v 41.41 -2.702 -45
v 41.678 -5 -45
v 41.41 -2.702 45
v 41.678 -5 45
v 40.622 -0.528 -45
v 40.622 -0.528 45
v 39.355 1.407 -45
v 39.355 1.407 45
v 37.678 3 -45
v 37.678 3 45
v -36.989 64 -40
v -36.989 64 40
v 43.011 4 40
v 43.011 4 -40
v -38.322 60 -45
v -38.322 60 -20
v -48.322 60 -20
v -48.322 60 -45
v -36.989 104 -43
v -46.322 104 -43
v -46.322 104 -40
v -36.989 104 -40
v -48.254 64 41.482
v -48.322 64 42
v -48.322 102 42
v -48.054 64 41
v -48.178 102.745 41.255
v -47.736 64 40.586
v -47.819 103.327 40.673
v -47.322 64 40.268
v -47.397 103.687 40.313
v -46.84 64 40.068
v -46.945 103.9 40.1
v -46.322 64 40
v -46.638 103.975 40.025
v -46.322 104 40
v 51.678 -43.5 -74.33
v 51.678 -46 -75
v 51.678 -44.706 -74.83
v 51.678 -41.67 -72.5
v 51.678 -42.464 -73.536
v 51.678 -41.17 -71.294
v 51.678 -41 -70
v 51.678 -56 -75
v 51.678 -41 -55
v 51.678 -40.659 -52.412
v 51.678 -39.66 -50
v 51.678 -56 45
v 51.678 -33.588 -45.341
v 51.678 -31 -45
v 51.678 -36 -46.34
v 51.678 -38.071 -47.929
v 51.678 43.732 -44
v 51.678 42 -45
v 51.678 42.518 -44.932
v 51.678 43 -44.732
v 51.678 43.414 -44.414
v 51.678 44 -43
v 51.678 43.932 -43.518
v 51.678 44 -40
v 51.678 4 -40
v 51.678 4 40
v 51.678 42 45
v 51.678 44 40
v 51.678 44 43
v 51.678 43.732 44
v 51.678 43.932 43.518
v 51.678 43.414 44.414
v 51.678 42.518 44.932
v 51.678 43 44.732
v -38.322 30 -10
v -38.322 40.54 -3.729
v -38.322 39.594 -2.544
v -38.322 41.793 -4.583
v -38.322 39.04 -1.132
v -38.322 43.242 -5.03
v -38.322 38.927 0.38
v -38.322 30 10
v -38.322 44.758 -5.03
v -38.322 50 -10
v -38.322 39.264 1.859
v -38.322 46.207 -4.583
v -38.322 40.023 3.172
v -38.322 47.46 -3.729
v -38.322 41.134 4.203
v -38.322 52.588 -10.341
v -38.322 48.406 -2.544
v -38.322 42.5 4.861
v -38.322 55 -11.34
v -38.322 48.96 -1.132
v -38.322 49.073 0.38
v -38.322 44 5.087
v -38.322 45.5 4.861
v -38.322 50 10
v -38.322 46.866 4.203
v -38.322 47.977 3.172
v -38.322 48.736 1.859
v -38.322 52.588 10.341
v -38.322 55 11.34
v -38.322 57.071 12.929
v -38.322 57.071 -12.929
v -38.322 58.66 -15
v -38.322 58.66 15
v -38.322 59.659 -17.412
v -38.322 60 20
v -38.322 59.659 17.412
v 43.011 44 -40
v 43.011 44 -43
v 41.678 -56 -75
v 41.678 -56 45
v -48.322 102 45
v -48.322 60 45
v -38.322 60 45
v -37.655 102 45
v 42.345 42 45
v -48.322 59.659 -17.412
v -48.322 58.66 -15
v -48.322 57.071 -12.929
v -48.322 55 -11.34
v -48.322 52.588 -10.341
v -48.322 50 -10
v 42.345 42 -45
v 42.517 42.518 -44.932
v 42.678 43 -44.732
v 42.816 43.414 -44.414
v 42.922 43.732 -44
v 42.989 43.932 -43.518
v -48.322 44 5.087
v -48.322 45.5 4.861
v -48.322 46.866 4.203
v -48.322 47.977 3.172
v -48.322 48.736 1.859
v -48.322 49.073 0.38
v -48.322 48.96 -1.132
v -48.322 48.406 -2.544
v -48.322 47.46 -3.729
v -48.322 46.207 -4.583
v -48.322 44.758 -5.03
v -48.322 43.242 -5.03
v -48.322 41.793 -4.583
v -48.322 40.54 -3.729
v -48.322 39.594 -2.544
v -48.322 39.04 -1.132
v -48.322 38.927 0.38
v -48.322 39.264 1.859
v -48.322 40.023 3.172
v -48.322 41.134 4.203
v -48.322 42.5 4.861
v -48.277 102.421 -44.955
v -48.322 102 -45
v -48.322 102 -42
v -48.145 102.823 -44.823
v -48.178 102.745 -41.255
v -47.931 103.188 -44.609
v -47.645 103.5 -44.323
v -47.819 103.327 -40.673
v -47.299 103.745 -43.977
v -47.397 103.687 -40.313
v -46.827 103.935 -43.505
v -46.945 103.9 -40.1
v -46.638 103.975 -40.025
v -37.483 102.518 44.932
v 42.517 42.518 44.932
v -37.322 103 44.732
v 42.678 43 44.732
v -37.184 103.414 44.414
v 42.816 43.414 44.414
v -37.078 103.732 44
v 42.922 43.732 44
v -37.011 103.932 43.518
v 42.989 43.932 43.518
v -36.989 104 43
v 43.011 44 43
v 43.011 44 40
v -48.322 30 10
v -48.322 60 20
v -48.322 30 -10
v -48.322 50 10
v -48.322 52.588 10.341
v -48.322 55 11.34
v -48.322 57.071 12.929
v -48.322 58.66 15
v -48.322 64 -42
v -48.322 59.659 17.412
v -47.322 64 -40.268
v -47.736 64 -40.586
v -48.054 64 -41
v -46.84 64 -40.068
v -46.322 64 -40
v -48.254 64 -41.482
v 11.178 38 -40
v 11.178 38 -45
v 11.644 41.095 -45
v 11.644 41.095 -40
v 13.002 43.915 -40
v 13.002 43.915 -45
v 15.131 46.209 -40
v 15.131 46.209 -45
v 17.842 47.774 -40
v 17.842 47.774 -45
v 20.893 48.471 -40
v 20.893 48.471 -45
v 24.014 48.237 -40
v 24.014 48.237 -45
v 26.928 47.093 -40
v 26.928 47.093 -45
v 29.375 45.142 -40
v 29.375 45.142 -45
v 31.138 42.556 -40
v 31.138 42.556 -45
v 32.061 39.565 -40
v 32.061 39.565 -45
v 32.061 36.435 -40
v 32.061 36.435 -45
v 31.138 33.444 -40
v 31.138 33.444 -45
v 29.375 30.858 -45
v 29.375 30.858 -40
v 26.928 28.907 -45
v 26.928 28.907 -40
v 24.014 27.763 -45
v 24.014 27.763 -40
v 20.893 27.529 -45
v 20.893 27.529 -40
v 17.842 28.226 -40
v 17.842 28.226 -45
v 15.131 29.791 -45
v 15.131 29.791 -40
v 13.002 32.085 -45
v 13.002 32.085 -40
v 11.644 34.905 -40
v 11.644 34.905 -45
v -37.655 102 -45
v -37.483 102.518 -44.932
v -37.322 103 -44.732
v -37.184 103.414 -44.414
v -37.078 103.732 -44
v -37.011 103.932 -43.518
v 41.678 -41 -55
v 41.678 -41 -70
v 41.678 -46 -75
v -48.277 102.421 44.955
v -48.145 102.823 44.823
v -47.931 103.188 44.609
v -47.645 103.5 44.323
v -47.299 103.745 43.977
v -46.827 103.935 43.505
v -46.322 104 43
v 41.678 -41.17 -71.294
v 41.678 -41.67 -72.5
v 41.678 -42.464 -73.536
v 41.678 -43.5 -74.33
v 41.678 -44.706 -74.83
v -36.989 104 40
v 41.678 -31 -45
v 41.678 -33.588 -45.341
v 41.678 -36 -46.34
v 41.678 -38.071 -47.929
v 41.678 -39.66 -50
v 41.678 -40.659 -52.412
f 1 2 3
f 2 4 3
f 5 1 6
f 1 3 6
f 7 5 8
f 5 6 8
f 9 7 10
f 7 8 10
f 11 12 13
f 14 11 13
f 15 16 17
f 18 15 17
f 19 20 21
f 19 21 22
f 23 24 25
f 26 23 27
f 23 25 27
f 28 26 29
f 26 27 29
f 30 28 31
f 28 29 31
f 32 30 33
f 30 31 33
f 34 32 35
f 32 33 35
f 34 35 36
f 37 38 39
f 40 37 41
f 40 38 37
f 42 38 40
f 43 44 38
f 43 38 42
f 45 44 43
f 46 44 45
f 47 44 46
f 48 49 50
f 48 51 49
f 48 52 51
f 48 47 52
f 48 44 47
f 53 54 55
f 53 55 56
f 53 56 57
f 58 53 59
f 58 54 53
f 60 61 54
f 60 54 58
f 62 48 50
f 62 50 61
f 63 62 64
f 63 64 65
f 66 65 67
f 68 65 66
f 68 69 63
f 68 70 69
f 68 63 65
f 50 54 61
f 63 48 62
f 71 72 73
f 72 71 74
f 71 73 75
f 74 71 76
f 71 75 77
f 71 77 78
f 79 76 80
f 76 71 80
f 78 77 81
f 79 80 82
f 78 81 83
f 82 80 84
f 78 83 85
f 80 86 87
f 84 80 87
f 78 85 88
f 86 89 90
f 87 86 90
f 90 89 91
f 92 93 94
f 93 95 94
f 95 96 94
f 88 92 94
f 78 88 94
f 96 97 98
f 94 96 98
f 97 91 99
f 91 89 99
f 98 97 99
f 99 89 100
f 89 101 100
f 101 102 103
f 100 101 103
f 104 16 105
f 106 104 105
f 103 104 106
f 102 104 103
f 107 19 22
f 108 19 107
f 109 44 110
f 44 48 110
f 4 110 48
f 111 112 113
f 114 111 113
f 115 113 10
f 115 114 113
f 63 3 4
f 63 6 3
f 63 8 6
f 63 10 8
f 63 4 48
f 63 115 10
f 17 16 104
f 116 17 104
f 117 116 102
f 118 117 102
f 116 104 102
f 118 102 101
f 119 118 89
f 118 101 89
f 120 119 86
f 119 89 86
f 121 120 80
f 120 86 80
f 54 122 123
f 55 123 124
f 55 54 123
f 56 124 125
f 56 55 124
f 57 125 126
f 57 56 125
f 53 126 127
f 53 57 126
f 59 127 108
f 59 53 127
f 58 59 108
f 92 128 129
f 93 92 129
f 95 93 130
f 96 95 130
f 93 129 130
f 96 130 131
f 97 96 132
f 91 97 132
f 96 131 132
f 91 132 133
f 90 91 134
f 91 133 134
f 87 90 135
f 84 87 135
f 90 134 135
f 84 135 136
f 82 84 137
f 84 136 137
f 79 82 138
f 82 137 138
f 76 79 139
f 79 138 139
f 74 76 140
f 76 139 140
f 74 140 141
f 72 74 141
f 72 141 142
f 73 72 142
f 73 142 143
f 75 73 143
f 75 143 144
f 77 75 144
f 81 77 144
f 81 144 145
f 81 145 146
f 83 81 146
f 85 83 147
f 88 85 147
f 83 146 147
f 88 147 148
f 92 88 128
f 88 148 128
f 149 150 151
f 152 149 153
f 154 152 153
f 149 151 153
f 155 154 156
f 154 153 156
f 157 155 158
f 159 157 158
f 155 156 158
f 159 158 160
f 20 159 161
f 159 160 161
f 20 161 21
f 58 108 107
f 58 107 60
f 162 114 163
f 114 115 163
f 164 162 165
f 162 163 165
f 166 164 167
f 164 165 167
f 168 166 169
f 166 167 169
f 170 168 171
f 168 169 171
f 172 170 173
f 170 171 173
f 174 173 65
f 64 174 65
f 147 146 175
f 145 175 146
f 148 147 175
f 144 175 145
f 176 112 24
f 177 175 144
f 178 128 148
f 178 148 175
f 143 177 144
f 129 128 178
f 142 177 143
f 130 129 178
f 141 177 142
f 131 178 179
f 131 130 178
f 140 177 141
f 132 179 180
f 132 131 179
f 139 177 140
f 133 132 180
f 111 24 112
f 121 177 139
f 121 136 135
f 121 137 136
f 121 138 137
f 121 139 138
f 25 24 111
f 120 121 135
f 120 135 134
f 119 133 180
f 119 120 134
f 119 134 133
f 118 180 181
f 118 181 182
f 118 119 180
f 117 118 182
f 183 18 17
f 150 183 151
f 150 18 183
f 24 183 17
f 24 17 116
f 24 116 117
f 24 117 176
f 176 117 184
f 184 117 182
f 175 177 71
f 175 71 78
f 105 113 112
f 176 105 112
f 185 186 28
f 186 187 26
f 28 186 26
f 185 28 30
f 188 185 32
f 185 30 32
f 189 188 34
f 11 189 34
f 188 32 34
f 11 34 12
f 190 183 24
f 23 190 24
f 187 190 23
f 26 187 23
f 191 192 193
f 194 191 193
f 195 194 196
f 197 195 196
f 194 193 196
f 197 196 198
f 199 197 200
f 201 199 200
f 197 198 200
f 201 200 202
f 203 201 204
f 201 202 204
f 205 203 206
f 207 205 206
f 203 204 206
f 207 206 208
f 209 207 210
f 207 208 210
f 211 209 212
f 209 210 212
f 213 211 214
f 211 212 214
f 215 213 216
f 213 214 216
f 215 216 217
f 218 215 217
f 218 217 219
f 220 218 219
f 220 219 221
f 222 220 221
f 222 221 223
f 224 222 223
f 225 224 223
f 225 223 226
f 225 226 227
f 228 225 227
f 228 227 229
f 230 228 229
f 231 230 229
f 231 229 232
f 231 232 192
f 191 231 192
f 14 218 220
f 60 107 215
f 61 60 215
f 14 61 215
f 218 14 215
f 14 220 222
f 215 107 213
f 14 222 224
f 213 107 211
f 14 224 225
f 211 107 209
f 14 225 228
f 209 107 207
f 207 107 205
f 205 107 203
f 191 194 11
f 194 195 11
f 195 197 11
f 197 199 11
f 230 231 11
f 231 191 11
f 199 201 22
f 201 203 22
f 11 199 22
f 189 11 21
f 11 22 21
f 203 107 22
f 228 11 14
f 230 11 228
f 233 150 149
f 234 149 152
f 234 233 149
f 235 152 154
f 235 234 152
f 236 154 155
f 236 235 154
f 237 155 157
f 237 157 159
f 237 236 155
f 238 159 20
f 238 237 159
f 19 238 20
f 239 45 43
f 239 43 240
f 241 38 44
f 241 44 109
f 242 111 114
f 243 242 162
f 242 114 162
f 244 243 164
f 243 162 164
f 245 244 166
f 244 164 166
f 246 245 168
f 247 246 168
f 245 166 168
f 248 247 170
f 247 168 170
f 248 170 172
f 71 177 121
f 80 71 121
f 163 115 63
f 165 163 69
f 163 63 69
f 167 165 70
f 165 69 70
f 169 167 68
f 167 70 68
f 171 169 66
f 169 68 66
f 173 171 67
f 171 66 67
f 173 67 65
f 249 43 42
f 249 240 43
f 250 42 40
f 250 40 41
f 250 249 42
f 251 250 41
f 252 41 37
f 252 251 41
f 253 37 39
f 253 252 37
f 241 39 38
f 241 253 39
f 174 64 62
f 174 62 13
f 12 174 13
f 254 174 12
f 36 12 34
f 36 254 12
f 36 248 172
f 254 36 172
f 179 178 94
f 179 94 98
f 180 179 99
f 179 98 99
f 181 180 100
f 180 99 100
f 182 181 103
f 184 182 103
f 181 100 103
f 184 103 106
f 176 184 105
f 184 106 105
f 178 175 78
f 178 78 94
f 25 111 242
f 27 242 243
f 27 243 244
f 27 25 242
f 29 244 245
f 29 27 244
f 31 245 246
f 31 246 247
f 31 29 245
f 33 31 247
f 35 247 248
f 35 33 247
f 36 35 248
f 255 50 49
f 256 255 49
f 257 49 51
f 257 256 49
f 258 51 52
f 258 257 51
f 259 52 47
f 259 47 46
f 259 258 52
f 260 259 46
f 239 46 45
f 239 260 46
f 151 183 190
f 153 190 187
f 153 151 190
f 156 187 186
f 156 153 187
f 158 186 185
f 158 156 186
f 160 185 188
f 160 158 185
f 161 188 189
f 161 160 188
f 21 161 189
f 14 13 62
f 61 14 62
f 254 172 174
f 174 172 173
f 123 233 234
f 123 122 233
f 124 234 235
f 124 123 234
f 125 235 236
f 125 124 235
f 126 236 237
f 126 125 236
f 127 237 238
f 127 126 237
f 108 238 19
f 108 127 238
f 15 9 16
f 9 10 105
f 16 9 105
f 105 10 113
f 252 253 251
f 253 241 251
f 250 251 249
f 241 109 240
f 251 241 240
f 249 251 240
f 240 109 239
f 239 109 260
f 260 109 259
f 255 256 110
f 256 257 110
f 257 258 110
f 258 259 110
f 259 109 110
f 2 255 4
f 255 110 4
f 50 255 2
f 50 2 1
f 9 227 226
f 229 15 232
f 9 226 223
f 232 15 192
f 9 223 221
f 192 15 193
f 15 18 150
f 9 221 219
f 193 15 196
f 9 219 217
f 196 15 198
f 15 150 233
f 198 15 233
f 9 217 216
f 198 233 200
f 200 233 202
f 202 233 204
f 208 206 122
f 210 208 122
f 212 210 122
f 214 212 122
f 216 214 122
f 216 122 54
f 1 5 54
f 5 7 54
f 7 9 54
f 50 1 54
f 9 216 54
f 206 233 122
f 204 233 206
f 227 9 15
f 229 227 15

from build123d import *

# Parameters (mm, degrees)
BOSS_EXTRUDE1_DEPTH = 45
BOSS_EXTRUDE2_DEPTH = 5
CUT_EXTRUDE1_REACH  = 148.924
SKETCH3_R           = 10.5
SKETCH5_W           = 20
SKETCH5_H           = 30
BOSS_EXTRUDE3_DEPTH = 10
SKETCH6_R           = 5.087291531
CUT_EXTRUDE2_DEPTH  = 10
SKETCH8_W           = 10
SKETCH8_H           = 56
BOSS_EXTRUDE4_DEPTH = 90
FILLET1_R           = 10
FILLET2_R           = 10
FILLET3_R           = 2
SKETCH9_W           = 10
SKETCH9_H           = 15
BOSS_EXTRUDE5_DEPTH = 30
FILLET4_R           = 10
FILLET5_R           = 5


with BuildPart() as part:
    # Sketch1 → Boss-Extrude1 (new, symmetric)
    with BuildSketch(Plane.XY):
        Polygon((41.677960524, 0), (-38.322039476, 60), (-48.322039476, 60), (-48.322039476, 64), (-36.988706143, 64), (43.011293857, 4), (51.677960524, 4), (51.677960524, 0), align=None)
    extrude(amount=BOSS_EXTRUDE1_DEPTH, both=True)

    # Sketch2 → Boss-Extrude2 (add)
    with BuildSketch(Plane.XY.offset(45)):
        Polygon((-48.322039476, 64), (-48.322039476, 104), (-36.988706143, 104), (43.011293857, 44), (51.677960524, 44), (51.677960524, 4), (43.011293857, 4), (-36.988706143, 64), align=None)
    boss_extrude2 = extrude(amount=-BOSS_EXTRUDE2_DEPTH)

    # Mirror1: Boss-Extrude2 across plane
    add(boss_extrude2.mirror(Plane.XY))

    # Sketch3 → Cut-Extrude1 (cut, up to next)
    with BuildSketch(Plane(origin=(0, 0, -45), x_dir=(-1, 0, 0), z_dir=(0, 0, -1)), mode=Mode.PRIVATE) as cut_extrude1_sk1:
        with Locations((-21.677960524, 38)):
            Circle(SKETCH3_R)
    cut_extrude1_tool1 = extrude(cut_extrude1_sk1.sketch, amount=-CUT_EXTRUDE1_REACH, mode=Mode.PRIVATE) & part.part
    add(cut_extrude1_tool1.solids().sort_by_distance((21.677961, 38, -45))[0], mode=Mode.SUBTRACT)

    # Sketch5 → Boss-Extrude3 (add)
    with BuildSketch(Plane.ZY.offset(48.322039476)):
        with Locations((0, 45)):
            Rectangle(SKETCH5_W, SKETCH5_H)
    extrude(amount=-BOSS_EXTRUDE3_DEPTH)

    # Sketch6 → Cut-Extrude2 (cut)
    with BuildSketch(Plane.ZY.offset(48.322039476)):
        with Locations((0, 44)):
            Circle(SKETCH6_R)
    extrude(amount=-CUT_EXTRUDE2_DEPTH, mode=Mode.SUBTRACT)

    # Sketch8 → Boss-Extrude4 (add)
    with BuildSketch(Plane.XY.offset(45)):
        with Locations((46.677960524, -28)):
            Rectangle(SKETCH8_W, SKETCH8_H)
    extrude(amount=-BOSS_EXTRUDE4_DEPTH)

    # Fillet1
    fillet1_edges = [part.edges().sort_by_distance(p)[0] for p in [
        (-43.322039476, 60, -10),
        (-43.322039476, 60, 10),
    ]]
    fillet(fillet1_edges, radius=FILLET1_R)

    # Fillet2
    fillet2_edges = [part.edges().sort_by_distance(p)[0] for p in [
        (41.677960524, 0, 0),
    ]]
    fillet(fillet2_edges, radius=FILLET2_R)

    # Fillet3
    fillet3_edges = [part.edges().sort_by_distance(p)[0] for p in [
        (-48.322039476, 84, 40),
        (-48.322039476, 104, 42.5),
        (47.344627191, 44, 45),
        (3.011293857, 74, 45),
        (-42.655372809, 104, 45),
        (47.344627191, 44, -45),
        (3.011293857, 74, -45),
        (-42.655372809, 104, -45),
        (-48.322039476, 104, -42.5),
        (-48.322039476, 84, -40),
    ]]
    fillet(fillet3_edges, radius=FILLET3_R)

    # Sketch9 → Boss-Extrude5 (add)
    with BuildSketch(Plane(origin=(0, 0, -45), x_dir=(-1, 0, 0), z_dir=(0, 0, -1))):
        with Locations((-46.677960524, -48.5)):
            Rectangle(SKETCH9_W, SKETCH9_H)
    extrude(amount=BOSS_EXTRUDE5_DEPTH)

    # Fillet4
    fillet4_edges = [part.edges().sort_by_distance(p)[0] for p in [
        (46.677960524, -41, -45),
    ]]
    fillet(fillet4_edges, radius=FILLET4_R)

    # Fillet5
    fillet5_edges = [part.edges().sort_by_distance(p)[0] for p in [
        (46.677960524, -41, -75),
    ]]
    fillet(fillet5_edges, radius=FILLET5_R)


solid = part.part
